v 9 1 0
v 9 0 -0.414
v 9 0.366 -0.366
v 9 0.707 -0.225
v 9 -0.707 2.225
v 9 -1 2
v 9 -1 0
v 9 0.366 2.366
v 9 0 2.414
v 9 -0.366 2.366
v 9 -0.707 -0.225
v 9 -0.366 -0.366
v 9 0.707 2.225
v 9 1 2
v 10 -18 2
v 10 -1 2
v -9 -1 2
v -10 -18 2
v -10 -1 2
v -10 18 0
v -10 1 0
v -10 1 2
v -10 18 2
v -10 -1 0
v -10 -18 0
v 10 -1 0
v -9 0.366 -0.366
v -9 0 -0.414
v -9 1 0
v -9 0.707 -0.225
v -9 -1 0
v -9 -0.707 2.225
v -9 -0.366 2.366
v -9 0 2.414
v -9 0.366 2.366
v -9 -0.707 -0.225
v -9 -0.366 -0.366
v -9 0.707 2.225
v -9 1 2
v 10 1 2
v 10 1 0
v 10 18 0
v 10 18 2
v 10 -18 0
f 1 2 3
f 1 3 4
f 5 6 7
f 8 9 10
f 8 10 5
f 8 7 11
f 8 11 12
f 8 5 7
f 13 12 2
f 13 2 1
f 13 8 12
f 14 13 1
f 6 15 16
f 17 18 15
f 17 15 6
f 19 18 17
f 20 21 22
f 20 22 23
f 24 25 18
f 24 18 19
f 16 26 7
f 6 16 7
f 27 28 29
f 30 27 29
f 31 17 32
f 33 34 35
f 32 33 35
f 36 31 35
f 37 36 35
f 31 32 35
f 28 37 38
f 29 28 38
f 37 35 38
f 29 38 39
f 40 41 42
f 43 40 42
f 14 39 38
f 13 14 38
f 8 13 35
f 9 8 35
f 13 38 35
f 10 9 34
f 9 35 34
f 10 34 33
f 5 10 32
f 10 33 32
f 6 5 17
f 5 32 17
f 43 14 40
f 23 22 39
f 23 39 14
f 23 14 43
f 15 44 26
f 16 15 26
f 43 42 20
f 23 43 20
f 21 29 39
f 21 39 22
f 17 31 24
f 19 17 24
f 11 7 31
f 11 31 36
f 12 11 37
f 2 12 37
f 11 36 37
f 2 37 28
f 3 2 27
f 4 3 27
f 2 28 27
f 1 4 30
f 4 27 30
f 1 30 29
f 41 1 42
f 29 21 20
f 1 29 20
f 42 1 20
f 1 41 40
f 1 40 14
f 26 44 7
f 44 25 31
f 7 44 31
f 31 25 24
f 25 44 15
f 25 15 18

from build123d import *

# Parameters (mm, degrees)
SKETCH1_W                = 17
SKETCH1_H                = 20
BOSS_EXTRUDE1_DEPTH      = 2
BOSS_EXTRUDE1_2_DEPTH    = 2
BOSS_EXTRUDE2_DEPTH      = 9
BOSS_EXTRUDE2_DEPTH_BACK = 9
SKETCH2_R                = 1.414213562


with BuildPart() as part:
    # Sketch1 → Boss-Extrude1 (new body)
    with BuildSketch(Plane(origin=(0, 0, 0), x_dir=(0, 1, 0), z_dir=(0, 0, 1))):
        with Locations((-9.5, 0)):
            Rectangle(SKETCH1_W, SKETCH1_H)
    extrude(amount=BOSS_EXTRUDE1_DEPTH)



with BuildPart() as body_2:
    # Sketch1 → Boss-Extrude1 2 (new body)
    with BuildSketch(Plane(origin=(0, 0, 0), x_dir=(0, 1, 0), z_dir=(0, 0, 1))):
        with Locations((9.5, 0)):
            Rectangle(SKETCH1_W, SKETCH1_H)
    extrude(amount=BOSS_EXTRUDE1_2_DEPTH)


with BuildPart() as part_1:
    add(part.part)

    add(body_2.part)  # Boss-Extrude2 merges body 2
    # Sketch2 → Boss-Extrude2 (add, two sides: drawn at the far end of the back side and taken through both)
    with BuildSketch(Plane.YZ.offset(-BOSS_EXTRUDE2_DEPTH_BACK)):
        with Locations((0, 1)):
            Circle(SKETCH2_R)
    extrude(amount=BOSS_EXTRUDE2_DEPTH + BOSS_EXTRUDE2_DEPTH_BACK)


solid = part_1.part
